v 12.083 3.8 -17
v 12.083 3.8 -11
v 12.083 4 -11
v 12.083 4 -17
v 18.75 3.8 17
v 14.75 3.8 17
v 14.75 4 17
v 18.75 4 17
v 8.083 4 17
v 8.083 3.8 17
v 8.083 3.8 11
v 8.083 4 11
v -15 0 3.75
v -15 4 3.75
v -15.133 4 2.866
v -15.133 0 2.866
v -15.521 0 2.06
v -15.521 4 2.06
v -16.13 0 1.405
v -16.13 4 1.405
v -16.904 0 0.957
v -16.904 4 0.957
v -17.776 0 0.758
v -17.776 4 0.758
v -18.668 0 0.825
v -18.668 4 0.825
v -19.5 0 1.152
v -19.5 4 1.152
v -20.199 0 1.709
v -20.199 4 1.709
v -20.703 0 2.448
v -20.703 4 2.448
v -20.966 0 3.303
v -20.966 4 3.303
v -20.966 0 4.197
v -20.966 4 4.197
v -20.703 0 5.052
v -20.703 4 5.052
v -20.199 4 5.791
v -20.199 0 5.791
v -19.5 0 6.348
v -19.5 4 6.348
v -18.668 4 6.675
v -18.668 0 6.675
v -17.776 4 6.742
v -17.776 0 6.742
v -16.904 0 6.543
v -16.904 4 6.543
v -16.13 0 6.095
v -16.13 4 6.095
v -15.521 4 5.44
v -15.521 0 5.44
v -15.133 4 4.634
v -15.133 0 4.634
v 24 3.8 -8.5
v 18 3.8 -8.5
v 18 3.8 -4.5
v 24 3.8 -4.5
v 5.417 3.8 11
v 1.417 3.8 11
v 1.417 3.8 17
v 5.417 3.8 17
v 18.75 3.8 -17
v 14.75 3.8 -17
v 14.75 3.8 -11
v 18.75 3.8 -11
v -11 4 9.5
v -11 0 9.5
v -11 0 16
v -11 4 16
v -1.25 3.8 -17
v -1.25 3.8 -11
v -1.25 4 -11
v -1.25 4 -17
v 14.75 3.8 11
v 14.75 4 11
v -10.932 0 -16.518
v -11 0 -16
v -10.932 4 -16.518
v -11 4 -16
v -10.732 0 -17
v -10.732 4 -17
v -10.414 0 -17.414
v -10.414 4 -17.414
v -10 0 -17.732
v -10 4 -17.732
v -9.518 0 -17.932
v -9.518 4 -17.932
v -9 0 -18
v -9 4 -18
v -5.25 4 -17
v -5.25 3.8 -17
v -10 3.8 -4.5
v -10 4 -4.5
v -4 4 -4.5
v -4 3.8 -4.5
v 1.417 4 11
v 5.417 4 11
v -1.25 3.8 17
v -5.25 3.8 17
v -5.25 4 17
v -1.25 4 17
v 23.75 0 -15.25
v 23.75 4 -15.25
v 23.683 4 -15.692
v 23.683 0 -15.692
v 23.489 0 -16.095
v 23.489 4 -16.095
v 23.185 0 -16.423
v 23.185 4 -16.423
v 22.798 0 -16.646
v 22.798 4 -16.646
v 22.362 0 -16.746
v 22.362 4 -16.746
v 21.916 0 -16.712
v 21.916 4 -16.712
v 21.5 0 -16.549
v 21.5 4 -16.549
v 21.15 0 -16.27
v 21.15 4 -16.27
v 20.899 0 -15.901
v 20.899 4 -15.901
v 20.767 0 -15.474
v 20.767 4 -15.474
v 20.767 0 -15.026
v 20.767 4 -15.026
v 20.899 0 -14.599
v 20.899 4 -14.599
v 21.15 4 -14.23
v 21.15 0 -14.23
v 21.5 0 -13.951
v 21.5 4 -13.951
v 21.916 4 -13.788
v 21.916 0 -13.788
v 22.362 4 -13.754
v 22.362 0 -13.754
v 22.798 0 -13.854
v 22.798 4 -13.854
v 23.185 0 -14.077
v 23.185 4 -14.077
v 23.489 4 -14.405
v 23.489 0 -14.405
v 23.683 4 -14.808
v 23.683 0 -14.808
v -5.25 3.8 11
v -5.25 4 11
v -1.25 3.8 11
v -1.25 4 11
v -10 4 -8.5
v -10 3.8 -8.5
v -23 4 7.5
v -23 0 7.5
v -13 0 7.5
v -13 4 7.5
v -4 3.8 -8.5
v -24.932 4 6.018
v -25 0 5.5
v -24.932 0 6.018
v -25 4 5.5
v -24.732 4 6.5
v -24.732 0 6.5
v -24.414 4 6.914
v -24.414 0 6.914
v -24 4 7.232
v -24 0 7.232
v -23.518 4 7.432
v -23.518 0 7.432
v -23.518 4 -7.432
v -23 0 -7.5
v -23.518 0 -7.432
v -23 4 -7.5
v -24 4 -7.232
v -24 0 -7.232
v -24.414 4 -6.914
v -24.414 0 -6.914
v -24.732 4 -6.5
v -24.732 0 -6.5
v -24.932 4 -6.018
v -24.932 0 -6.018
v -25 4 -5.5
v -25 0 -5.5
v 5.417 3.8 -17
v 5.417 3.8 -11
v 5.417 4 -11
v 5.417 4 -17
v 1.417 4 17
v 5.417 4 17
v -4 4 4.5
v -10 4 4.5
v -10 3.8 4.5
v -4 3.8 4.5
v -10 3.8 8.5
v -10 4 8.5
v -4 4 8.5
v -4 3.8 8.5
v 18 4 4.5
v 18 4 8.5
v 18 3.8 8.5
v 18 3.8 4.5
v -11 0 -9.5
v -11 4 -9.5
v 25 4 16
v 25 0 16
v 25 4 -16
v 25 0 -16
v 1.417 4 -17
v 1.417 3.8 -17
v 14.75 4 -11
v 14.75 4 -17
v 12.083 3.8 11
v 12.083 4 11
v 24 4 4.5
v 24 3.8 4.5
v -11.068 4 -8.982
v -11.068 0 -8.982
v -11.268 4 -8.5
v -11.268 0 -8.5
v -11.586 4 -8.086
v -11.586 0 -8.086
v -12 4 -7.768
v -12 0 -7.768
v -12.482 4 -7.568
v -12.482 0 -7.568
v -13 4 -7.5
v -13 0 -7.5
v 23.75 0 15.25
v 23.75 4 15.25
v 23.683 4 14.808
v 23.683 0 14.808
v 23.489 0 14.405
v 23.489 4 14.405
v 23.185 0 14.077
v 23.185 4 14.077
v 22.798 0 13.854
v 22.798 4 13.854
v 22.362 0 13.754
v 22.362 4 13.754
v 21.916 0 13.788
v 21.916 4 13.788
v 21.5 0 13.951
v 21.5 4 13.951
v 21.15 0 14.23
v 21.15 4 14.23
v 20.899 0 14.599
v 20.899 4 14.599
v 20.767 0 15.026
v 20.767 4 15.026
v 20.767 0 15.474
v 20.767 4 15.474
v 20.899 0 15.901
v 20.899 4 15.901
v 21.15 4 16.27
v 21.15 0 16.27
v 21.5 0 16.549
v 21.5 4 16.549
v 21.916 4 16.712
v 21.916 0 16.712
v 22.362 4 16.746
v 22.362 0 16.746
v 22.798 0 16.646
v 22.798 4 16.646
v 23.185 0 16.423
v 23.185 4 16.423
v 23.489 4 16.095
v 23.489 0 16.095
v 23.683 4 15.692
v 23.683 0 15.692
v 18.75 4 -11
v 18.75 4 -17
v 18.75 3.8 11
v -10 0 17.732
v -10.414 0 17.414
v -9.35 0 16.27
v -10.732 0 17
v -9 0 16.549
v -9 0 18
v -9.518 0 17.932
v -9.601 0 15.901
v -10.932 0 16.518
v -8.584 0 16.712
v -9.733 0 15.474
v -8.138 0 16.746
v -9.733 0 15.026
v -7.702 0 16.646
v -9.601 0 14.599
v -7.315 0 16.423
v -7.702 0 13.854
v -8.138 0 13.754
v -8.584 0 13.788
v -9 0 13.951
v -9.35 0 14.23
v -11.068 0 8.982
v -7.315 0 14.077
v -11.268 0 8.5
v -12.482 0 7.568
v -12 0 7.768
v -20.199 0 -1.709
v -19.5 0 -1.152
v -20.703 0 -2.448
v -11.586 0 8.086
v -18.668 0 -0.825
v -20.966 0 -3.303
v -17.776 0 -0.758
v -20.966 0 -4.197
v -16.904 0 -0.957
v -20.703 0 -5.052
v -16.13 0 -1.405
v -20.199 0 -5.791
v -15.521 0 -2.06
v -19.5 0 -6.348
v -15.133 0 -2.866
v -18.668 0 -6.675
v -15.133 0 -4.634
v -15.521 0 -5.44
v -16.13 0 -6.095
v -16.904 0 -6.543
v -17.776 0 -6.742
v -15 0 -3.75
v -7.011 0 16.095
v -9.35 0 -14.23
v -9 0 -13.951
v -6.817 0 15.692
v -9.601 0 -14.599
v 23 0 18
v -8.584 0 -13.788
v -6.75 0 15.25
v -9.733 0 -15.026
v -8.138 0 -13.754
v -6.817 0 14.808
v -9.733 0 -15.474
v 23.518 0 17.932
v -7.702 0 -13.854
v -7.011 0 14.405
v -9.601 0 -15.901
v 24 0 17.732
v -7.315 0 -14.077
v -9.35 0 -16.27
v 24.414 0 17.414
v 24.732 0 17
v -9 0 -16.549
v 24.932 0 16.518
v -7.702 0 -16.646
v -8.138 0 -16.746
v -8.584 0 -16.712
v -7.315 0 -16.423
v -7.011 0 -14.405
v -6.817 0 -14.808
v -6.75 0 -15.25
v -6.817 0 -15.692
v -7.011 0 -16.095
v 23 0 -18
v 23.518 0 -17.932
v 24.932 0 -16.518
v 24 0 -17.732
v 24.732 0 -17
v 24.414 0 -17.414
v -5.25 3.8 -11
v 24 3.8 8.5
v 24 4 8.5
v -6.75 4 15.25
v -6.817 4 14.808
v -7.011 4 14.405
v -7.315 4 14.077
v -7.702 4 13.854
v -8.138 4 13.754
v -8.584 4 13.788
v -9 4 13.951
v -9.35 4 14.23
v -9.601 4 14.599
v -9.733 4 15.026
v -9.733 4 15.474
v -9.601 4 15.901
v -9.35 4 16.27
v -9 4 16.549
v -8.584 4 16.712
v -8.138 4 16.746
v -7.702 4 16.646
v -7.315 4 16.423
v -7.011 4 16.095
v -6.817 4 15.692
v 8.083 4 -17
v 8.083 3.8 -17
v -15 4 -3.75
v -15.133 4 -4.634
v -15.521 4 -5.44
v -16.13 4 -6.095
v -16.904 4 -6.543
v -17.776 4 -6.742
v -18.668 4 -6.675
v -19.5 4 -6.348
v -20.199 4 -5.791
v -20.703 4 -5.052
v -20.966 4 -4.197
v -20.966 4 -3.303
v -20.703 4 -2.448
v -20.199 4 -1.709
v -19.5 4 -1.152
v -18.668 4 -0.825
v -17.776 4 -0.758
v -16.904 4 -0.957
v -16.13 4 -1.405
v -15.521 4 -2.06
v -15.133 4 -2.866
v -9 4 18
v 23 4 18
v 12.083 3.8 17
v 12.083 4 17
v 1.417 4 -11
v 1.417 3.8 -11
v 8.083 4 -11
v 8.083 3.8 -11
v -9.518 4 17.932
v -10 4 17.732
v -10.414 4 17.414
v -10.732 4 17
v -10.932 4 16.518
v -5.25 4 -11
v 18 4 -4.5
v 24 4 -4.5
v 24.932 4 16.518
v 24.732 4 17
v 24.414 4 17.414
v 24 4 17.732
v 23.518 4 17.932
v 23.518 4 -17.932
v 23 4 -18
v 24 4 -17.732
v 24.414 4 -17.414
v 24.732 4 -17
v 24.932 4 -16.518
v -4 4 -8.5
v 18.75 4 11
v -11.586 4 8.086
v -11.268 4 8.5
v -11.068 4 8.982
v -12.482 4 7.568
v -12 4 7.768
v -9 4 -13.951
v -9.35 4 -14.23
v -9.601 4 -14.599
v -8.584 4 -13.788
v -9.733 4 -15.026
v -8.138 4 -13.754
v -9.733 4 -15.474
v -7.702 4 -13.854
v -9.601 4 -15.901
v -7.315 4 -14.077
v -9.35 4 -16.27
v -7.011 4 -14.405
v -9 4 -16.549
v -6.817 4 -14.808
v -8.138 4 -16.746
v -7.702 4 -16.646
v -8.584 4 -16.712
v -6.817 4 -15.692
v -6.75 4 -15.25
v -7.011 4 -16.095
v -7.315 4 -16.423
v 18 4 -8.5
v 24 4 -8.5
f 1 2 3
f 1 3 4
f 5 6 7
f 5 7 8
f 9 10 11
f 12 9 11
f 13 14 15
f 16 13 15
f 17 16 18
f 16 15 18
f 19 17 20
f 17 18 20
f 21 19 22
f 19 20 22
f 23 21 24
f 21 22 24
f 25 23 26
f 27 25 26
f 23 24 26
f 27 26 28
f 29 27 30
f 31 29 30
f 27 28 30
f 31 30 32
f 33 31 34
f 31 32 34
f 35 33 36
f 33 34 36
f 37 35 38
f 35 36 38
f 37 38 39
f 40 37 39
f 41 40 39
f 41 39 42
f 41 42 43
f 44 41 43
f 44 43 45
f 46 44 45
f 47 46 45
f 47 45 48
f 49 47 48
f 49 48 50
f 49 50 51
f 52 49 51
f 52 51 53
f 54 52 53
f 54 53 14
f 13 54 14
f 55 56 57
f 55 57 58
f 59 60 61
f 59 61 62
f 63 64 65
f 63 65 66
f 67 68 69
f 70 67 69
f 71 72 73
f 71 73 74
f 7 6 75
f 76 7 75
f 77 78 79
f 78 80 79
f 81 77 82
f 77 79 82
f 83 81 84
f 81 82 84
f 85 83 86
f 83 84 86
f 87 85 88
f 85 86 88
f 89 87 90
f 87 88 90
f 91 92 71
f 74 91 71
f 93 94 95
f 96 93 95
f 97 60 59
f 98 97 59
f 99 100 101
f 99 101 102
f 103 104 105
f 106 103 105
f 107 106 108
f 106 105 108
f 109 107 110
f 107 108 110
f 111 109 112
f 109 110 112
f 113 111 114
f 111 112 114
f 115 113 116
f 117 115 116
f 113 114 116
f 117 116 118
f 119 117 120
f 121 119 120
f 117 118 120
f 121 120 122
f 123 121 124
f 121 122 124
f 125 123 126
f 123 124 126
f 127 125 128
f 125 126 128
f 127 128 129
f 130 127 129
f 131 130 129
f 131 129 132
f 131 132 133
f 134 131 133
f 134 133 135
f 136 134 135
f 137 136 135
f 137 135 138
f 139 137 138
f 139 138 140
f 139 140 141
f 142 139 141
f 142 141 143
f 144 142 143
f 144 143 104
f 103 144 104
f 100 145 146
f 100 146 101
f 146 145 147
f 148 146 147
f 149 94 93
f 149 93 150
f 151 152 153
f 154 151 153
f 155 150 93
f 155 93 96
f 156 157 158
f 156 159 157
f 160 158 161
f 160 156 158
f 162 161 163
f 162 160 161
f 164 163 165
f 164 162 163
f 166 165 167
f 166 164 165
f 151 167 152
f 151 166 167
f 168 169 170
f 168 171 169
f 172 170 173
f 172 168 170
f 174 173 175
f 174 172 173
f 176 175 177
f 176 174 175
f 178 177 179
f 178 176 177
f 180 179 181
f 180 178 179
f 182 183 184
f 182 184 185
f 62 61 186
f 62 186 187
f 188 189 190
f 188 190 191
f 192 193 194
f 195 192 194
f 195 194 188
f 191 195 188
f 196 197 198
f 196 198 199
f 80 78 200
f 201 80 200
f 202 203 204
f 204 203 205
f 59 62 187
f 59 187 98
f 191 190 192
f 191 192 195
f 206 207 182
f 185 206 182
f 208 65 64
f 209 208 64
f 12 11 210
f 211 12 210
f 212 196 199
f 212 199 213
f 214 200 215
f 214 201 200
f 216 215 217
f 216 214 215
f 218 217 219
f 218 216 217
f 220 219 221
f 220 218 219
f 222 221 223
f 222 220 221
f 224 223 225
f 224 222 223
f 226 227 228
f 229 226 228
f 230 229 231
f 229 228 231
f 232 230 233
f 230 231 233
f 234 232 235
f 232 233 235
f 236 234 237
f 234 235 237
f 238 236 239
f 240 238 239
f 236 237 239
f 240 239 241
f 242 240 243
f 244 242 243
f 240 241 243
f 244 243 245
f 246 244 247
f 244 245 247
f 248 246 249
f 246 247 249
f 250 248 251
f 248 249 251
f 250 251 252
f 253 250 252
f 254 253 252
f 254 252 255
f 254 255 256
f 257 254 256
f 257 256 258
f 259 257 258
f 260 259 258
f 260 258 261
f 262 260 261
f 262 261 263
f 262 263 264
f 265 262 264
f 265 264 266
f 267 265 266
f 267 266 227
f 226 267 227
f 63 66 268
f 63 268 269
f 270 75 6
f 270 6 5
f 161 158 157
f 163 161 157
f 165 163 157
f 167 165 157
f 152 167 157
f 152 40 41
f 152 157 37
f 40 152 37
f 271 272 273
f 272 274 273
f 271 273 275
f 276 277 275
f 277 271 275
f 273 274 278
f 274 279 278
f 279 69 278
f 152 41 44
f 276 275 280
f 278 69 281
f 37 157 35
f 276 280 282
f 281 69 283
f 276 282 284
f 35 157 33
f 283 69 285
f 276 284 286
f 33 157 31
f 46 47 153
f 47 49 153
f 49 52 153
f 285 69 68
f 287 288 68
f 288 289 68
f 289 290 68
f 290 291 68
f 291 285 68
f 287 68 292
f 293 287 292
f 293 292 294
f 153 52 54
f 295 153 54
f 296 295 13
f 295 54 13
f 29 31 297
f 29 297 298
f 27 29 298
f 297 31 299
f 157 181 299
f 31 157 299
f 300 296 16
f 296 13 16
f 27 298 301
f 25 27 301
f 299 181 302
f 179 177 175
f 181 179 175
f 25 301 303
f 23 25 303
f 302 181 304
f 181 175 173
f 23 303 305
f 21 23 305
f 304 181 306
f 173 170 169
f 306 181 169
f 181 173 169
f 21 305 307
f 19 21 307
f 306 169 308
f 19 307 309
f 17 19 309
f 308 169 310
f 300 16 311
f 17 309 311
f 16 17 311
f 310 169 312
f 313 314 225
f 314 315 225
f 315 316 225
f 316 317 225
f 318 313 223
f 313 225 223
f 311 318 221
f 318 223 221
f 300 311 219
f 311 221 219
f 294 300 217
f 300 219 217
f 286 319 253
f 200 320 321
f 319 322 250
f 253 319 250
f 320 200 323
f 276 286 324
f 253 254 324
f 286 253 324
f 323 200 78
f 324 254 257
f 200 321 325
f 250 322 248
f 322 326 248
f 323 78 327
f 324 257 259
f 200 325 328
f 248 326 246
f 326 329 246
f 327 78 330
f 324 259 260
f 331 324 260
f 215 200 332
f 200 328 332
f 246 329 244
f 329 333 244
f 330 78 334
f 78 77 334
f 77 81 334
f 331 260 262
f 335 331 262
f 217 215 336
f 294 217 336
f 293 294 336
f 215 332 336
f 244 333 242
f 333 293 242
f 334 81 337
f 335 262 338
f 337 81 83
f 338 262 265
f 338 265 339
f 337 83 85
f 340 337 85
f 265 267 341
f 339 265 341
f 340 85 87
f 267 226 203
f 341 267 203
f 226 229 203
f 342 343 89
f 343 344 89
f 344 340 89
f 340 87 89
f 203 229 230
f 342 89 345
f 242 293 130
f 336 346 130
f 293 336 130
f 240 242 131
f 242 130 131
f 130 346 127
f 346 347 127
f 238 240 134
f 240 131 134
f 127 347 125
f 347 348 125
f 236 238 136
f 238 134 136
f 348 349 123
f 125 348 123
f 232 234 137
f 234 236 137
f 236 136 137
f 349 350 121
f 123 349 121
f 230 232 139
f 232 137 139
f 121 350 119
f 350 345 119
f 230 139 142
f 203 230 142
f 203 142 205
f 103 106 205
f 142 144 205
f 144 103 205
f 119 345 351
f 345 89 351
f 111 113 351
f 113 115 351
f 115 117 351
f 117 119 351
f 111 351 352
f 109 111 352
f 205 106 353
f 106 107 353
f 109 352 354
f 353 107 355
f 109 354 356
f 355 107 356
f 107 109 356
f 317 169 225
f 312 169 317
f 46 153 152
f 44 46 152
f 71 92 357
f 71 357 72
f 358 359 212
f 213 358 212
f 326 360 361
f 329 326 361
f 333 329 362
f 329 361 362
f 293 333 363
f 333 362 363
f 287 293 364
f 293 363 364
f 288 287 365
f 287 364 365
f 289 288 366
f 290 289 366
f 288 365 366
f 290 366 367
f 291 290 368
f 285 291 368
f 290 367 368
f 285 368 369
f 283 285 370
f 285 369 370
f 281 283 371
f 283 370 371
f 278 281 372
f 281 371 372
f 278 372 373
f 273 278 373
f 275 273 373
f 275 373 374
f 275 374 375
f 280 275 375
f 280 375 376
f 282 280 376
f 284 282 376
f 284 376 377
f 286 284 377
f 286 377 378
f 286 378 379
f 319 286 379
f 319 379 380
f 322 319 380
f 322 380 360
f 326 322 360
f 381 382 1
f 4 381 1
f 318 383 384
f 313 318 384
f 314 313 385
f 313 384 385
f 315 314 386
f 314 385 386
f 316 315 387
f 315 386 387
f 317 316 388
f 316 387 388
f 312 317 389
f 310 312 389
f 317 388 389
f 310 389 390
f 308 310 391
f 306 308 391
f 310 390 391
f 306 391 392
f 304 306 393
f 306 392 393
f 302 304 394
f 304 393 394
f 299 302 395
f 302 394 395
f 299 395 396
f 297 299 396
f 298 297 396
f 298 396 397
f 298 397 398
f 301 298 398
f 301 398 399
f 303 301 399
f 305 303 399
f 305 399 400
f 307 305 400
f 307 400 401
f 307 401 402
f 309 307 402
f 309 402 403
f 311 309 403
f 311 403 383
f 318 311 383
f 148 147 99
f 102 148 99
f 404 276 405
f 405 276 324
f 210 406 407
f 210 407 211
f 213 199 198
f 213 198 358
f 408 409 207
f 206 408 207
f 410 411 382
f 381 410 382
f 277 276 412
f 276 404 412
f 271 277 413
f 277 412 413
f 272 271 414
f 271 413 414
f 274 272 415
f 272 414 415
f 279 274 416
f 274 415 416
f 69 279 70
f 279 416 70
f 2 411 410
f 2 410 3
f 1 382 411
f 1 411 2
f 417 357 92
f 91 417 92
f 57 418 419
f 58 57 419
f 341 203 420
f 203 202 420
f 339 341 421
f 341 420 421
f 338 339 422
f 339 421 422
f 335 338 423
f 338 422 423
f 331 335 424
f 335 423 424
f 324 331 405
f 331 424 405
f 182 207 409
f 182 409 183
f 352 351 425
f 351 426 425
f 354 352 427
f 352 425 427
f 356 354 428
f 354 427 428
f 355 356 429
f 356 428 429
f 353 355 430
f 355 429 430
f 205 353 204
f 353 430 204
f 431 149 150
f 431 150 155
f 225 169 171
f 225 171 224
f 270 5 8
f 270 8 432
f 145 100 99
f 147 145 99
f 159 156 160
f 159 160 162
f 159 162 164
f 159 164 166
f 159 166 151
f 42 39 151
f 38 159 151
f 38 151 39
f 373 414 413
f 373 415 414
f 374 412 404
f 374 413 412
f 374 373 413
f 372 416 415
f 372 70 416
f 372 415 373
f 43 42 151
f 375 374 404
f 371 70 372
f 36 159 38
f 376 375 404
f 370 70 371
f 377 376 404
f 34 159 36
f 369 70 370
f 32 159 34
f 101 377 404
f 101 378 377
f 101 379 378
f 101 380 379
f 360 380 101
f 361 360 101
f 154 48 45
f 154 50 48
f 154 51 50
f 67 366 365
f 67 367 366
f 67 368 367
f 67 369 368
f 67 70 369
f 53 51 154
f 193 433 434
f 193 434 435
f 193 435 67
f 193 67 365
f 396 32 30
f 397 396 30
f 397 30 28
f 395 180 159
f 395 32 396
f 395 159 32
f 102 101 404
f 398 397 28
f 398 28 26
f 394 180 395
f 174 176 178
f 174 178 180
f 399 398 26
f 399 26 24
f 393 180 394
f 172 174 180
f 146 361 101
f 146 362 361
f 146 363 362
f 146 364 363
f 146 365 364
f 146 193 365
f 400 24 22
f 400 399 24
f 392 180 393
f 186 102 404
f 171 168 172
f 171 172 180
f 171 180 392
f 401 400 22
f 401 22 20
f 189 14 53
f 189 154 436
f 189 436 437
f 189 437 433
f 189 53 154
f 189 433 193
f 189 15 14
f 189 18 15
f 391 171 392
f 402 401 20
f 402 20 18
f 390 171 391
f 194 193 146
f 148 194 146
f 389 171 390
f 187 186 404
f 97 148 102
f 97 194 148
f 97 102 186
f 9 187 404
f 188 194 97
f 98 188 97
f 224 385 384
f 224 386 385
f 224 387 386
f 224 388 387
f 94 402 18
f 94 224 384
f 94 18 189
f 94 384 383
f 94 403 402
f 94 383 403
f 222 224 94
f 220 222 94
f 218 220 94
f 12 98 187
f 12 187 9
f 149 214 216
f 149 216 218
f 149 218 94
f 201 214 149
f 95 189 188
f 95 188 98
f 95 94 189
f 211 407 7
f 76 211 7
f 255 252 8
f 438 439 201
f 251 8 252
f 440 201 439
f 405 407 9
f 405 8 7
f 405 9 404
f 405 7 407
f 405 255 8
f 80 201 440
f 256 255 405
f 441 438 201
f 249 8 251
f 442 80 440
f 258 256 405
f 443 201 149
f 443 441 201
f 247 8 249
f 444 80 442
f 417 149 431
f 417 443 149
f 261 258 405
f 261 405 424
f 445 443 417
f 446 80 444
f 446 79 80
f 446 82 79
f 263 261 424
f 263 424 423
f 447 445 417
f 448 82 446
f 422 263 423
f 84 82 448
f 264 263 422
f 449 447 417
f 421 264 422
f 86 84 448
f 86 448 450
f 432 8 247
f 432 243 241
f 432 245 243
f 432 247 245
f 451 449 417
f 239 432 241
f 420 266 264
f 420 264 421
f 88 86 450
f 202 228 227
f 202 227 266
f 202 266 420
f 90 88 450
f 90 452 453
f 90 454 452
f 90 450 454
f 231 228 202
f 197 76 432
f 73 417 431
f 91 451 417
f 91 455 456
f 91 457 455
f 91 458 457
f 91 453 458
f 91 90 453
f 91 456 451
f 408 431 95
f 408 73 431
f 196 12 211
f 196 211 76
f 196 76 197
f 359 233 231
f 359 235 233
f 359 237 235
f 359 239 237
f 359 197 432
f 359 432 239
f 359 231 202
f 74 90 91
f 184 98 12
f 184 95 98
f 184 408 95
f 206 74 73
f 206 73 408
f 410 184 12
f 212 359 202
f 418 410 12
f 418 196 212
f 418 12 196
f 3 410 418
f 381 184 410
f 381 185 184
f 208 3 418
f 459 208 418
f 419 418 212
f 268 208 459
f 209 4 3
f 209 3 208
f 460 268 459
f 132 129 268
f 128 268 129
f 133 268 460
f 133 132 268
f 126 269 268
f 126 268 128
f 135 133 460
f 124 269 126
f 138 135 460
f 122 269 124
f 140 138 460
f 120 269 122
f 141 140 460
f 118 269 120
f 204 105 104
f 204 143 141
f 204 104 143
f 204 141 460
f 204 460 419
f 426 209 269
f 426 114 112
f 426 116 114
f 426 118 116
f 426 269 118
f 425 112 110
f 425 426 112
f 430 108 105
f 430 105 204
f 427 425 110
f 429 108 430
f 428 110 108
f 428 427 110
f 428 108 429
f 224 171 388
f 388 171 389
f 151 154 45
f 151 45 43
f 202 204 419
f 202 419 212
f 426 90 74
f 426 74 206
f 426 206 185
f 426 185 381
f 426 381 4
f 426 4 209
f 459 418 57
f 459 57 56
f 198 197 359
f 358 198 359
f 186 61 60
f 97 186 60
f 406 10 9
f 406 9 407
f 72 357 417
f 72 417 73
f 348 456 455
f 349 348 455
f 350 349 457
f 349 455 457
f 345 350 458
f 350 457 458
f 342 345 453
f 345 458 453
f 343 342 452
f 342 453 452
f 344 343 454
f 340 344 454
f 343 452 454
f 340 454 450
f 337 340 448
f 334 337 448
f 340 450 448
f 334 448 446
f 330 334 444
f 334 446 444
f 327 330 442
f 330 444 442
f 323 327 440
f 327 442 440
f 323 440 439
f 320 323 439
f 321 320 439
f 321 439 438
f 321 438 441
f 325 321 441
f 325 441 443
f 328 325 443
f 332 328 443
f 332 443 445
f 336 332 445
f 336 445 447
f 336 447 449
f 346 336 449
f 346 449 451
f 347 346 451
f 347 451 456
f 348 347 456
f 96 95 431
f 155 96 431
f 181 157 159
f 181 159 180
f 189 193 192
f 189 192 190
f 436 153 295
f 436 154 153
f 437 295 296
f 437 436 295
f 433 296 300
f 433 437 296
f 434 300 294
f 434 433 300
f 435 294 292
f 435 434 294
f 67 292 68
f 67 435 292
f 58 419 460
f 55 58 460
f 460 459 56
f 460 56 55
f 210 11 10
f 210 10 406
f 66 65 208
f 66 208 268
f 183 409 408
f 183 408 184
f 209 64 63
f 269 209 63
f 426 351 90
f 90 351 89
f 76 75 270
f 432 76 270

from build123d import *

# Parameters (mm, degrees)
SKETCH1_W               = 14
SKETCH1_H               = 15
BOSS_EXTRUDE1_DEPTH     = 4
SKETCH2_R               = 3
SKETCH2_R_2             = 1.5
CUT_EXTRUDE1_DEPTH      = 1
CUT_EXTRUDE1_DEPTH_BACK = 5
FILLET1_R               = 2
CUT_EXTRUDE2_START      = -0.2
SKETCH3_W               = 4
SKETCH3_H               = 6
CUT_EXTRUDE2_DEPTH      = 1.2
LPATTERN1_COUNT         = 4
LPATTERN1_PITCH         = 6.666666667
MIRROR1_START           = -0.2
MIRROR1_COPY_1_SKETCH_W = 4
MIRROR1_COPY_1_SKETCH_H = 6
MIRROR1_COPY_1_DEPTH    = 1.2
MIRROR1_COPY_2_SKETCH_W = 4
MIRROR1_COPY_2_SKETCH_H = 6
MIRROR1_COPY_2_DEPTH    = 1.2
MIRROR1_COPY_3_SKETCH_W = 4
MIRROR1_COPY_3_SKETCH_H = 6
MIRROR1_COPY_3_DEPTH    = 1.2
SKETCH4_W               = 6
SKETCH4_H               = 4
CUT_EXTRUDE3_DEPTH      = 1
CUT_EXTRUDE3_DEPTH_BACK = 0.2


with BuildPart() as part:
    # Sketch1 → Boss-Extrude1 (new body)
    with BuildSketch(Plane(origin=(0, 0, 0), x_dir=(1, 0, 0), z_dir=(0, 1, 0))):
        Polygon((-11, 18), (-11, 7.5), (-11, -7.5), (-11, -18), (25, -18), (25, 18), align=None)
        with Locations((-18, 0)):
            Rectangle(SKETCH1_W, SKETCH1_H)
    extrude(amount=BOSS_EXTRUDE1_DEPTH)

    # Sketch2 → Cut-Extrude1 (cut, two sides)
    with BuildSketch(Plane(origin=(0, 4, 0), x_dir=(1, 0, 0), z_dir=(0, 1, 0))) as cut_extrude1_sk:
        with Locations((-18, 3.75)):
            Circle(SKETCH2_R)
        with Locations((-8.25, 15.25)):
            Circle(SKETCH2_R_2)
        with Locations((22.25, 15.25)):
            Circle(SKETCH2_R_2)
        with Locations((-18, -3.75)):
            Circle(SKETCH2_R)
        with Locations((22.25, -15.25)):
            Circle(SKETCH2_R_2)
        with Locations((-8.25, -15.25)):
            Circle(SKETCH2_R_2)
    extrude(amount=CUT_EXTRUDE1_DEPTH, mode=Mode.SUBTRACT)
    extrude(cut_extrude1_sk.sketch, amount=-CUT_EXTRUDE1_DEPTH_BACK, mode=Mode.SUBTRACT)

    # Fillet1
    fillet1_edges = [part.edges().sort_by_distance(p)[0] for p in [
        (-11, 2, -18),
        (25, 2, -18),
        (25, 2, 18),
        (-11, 2, 18),
        (-11, 2, 7.5),
        (-25, 2, 7.5),
        (-25, 2, -7.5),
        (-11, 2, -7.5),
    ]]
    fillet(fillet1_edges, radius=FILLET1_R)

    # Sketch3 → Cut-Extrude2 (cut)
    with BuildSketch(Plane(origin=(0, 4, 0), x_dir=(1, 0, 0), z_dir=(0, 1, 0)).offset(CUT_EXTRUDE2_START)):
        with Locations((-3.25, 14)):
            Rectangle(SKETCH3_W, SKETCH3_H)
    cut_extrude2 = extrude(amount=CUT_EXTRUDE2_DEPTH, mode=Mode.SUBTRACT)

    # LPattern1: Cut-Extrude2 ×4
    with Locations(*[(i * LPATTERN1_PITCH, 0, 0) for i in range(1, LPATTERN1_COUNT)]):
        add(cut_extrude2, mode=Mode.SUBTRACT)

    # Mirror1: Cut-Extrude2 across plane
    add(cut_extrude2.mirror(Plane.XY), mode=Mode.SUBTRACT)

    # Mirror1 copy 1 sketch → Mirror1 copy 1 (cut)
    with BuildSketch(Plane(origin=(6.666666667, 4, 0), x_dir=(1, 0, 0), z_dir=(0, 1, 0)).offset(MIRROR1_START)):
        with Locations((-3.25, -14)):
            Rectangle(MIRROR1_COPY_1_SKETCH_W, MIRROR1_COPY_1_SKETCH_H)
    extrude(amount=MIRROR1_COPY_1_DEPTH, mode=Mode.SUBTRACT)

    # Mirror1 copy 2 sketch → Mirror1 copy 2 (cut)
    with BuildSketch(Plane(origin=(13.333333333, 4, 0), x_dir=(1, 0, 0), z_dir=(0, 1, 0)).offset(MIRROR1_START)):
        with Locations((-3.25, -14)):
            Rectangle(MIRROR1_COPY_2_SKETCH_W, MIRROR1_COPY_2_SKETCH_H)
    extrude(amount=MIRROR1_COPY_2_DEPTH, mode=Mode.SUBTRACT)

    # Mirror1 copy 3 sketch → Mirror1 copy 3 (cut)
    with BuildSketch(Plane(origin=(20, 4, 0), x_dir=(1, 0, 0), z_dir=(0, 1, 0)).offset(MIRROR1_START)):
        with Locations((-3.25, -14)):
            Rectangle(MIRROR1_COPY_3_SKETCH_W, MIRROR1_COPY_3_SKETCH_H)
    extrude(amount=MIRROR1_COPY_3_DEPTH, mode=Mode.SUBTRACT)

    # Sketch4 → Cut-Extrude3 (cut, two sides)
    with BuildSketch(Plane(origin=(0, 4, 0), x_dir=(1, 0, 0), z_dir=(0, 1, 0))) as cut_extrude3_sk:
        with Locations((21, 6.5)):
            Rectangle(SKETCH4_W, SKETCH4_H)
        with Locations((-7, 6.5)):
            Rectangle(SKETCH4_W, SKETCH4_H)
        with Locations((-7, -6.5)):
            Rectangle(SKETCH4_W, SKETCH4_H)
        with Locations((21, -6.5)):
            Rectangle(SKETCH4_W, SKETCH4_H)
    extrude(amount=CUT_EXTRUDE3_DEPTH, mode=Mode.SUBTRACT)
    extrude(cut_extrude3_sk.sketch, amount=-CUT_EXTRUDE3_DEPTH_BACK, mode=Mode.SUBTRACT)


solid = part.part
